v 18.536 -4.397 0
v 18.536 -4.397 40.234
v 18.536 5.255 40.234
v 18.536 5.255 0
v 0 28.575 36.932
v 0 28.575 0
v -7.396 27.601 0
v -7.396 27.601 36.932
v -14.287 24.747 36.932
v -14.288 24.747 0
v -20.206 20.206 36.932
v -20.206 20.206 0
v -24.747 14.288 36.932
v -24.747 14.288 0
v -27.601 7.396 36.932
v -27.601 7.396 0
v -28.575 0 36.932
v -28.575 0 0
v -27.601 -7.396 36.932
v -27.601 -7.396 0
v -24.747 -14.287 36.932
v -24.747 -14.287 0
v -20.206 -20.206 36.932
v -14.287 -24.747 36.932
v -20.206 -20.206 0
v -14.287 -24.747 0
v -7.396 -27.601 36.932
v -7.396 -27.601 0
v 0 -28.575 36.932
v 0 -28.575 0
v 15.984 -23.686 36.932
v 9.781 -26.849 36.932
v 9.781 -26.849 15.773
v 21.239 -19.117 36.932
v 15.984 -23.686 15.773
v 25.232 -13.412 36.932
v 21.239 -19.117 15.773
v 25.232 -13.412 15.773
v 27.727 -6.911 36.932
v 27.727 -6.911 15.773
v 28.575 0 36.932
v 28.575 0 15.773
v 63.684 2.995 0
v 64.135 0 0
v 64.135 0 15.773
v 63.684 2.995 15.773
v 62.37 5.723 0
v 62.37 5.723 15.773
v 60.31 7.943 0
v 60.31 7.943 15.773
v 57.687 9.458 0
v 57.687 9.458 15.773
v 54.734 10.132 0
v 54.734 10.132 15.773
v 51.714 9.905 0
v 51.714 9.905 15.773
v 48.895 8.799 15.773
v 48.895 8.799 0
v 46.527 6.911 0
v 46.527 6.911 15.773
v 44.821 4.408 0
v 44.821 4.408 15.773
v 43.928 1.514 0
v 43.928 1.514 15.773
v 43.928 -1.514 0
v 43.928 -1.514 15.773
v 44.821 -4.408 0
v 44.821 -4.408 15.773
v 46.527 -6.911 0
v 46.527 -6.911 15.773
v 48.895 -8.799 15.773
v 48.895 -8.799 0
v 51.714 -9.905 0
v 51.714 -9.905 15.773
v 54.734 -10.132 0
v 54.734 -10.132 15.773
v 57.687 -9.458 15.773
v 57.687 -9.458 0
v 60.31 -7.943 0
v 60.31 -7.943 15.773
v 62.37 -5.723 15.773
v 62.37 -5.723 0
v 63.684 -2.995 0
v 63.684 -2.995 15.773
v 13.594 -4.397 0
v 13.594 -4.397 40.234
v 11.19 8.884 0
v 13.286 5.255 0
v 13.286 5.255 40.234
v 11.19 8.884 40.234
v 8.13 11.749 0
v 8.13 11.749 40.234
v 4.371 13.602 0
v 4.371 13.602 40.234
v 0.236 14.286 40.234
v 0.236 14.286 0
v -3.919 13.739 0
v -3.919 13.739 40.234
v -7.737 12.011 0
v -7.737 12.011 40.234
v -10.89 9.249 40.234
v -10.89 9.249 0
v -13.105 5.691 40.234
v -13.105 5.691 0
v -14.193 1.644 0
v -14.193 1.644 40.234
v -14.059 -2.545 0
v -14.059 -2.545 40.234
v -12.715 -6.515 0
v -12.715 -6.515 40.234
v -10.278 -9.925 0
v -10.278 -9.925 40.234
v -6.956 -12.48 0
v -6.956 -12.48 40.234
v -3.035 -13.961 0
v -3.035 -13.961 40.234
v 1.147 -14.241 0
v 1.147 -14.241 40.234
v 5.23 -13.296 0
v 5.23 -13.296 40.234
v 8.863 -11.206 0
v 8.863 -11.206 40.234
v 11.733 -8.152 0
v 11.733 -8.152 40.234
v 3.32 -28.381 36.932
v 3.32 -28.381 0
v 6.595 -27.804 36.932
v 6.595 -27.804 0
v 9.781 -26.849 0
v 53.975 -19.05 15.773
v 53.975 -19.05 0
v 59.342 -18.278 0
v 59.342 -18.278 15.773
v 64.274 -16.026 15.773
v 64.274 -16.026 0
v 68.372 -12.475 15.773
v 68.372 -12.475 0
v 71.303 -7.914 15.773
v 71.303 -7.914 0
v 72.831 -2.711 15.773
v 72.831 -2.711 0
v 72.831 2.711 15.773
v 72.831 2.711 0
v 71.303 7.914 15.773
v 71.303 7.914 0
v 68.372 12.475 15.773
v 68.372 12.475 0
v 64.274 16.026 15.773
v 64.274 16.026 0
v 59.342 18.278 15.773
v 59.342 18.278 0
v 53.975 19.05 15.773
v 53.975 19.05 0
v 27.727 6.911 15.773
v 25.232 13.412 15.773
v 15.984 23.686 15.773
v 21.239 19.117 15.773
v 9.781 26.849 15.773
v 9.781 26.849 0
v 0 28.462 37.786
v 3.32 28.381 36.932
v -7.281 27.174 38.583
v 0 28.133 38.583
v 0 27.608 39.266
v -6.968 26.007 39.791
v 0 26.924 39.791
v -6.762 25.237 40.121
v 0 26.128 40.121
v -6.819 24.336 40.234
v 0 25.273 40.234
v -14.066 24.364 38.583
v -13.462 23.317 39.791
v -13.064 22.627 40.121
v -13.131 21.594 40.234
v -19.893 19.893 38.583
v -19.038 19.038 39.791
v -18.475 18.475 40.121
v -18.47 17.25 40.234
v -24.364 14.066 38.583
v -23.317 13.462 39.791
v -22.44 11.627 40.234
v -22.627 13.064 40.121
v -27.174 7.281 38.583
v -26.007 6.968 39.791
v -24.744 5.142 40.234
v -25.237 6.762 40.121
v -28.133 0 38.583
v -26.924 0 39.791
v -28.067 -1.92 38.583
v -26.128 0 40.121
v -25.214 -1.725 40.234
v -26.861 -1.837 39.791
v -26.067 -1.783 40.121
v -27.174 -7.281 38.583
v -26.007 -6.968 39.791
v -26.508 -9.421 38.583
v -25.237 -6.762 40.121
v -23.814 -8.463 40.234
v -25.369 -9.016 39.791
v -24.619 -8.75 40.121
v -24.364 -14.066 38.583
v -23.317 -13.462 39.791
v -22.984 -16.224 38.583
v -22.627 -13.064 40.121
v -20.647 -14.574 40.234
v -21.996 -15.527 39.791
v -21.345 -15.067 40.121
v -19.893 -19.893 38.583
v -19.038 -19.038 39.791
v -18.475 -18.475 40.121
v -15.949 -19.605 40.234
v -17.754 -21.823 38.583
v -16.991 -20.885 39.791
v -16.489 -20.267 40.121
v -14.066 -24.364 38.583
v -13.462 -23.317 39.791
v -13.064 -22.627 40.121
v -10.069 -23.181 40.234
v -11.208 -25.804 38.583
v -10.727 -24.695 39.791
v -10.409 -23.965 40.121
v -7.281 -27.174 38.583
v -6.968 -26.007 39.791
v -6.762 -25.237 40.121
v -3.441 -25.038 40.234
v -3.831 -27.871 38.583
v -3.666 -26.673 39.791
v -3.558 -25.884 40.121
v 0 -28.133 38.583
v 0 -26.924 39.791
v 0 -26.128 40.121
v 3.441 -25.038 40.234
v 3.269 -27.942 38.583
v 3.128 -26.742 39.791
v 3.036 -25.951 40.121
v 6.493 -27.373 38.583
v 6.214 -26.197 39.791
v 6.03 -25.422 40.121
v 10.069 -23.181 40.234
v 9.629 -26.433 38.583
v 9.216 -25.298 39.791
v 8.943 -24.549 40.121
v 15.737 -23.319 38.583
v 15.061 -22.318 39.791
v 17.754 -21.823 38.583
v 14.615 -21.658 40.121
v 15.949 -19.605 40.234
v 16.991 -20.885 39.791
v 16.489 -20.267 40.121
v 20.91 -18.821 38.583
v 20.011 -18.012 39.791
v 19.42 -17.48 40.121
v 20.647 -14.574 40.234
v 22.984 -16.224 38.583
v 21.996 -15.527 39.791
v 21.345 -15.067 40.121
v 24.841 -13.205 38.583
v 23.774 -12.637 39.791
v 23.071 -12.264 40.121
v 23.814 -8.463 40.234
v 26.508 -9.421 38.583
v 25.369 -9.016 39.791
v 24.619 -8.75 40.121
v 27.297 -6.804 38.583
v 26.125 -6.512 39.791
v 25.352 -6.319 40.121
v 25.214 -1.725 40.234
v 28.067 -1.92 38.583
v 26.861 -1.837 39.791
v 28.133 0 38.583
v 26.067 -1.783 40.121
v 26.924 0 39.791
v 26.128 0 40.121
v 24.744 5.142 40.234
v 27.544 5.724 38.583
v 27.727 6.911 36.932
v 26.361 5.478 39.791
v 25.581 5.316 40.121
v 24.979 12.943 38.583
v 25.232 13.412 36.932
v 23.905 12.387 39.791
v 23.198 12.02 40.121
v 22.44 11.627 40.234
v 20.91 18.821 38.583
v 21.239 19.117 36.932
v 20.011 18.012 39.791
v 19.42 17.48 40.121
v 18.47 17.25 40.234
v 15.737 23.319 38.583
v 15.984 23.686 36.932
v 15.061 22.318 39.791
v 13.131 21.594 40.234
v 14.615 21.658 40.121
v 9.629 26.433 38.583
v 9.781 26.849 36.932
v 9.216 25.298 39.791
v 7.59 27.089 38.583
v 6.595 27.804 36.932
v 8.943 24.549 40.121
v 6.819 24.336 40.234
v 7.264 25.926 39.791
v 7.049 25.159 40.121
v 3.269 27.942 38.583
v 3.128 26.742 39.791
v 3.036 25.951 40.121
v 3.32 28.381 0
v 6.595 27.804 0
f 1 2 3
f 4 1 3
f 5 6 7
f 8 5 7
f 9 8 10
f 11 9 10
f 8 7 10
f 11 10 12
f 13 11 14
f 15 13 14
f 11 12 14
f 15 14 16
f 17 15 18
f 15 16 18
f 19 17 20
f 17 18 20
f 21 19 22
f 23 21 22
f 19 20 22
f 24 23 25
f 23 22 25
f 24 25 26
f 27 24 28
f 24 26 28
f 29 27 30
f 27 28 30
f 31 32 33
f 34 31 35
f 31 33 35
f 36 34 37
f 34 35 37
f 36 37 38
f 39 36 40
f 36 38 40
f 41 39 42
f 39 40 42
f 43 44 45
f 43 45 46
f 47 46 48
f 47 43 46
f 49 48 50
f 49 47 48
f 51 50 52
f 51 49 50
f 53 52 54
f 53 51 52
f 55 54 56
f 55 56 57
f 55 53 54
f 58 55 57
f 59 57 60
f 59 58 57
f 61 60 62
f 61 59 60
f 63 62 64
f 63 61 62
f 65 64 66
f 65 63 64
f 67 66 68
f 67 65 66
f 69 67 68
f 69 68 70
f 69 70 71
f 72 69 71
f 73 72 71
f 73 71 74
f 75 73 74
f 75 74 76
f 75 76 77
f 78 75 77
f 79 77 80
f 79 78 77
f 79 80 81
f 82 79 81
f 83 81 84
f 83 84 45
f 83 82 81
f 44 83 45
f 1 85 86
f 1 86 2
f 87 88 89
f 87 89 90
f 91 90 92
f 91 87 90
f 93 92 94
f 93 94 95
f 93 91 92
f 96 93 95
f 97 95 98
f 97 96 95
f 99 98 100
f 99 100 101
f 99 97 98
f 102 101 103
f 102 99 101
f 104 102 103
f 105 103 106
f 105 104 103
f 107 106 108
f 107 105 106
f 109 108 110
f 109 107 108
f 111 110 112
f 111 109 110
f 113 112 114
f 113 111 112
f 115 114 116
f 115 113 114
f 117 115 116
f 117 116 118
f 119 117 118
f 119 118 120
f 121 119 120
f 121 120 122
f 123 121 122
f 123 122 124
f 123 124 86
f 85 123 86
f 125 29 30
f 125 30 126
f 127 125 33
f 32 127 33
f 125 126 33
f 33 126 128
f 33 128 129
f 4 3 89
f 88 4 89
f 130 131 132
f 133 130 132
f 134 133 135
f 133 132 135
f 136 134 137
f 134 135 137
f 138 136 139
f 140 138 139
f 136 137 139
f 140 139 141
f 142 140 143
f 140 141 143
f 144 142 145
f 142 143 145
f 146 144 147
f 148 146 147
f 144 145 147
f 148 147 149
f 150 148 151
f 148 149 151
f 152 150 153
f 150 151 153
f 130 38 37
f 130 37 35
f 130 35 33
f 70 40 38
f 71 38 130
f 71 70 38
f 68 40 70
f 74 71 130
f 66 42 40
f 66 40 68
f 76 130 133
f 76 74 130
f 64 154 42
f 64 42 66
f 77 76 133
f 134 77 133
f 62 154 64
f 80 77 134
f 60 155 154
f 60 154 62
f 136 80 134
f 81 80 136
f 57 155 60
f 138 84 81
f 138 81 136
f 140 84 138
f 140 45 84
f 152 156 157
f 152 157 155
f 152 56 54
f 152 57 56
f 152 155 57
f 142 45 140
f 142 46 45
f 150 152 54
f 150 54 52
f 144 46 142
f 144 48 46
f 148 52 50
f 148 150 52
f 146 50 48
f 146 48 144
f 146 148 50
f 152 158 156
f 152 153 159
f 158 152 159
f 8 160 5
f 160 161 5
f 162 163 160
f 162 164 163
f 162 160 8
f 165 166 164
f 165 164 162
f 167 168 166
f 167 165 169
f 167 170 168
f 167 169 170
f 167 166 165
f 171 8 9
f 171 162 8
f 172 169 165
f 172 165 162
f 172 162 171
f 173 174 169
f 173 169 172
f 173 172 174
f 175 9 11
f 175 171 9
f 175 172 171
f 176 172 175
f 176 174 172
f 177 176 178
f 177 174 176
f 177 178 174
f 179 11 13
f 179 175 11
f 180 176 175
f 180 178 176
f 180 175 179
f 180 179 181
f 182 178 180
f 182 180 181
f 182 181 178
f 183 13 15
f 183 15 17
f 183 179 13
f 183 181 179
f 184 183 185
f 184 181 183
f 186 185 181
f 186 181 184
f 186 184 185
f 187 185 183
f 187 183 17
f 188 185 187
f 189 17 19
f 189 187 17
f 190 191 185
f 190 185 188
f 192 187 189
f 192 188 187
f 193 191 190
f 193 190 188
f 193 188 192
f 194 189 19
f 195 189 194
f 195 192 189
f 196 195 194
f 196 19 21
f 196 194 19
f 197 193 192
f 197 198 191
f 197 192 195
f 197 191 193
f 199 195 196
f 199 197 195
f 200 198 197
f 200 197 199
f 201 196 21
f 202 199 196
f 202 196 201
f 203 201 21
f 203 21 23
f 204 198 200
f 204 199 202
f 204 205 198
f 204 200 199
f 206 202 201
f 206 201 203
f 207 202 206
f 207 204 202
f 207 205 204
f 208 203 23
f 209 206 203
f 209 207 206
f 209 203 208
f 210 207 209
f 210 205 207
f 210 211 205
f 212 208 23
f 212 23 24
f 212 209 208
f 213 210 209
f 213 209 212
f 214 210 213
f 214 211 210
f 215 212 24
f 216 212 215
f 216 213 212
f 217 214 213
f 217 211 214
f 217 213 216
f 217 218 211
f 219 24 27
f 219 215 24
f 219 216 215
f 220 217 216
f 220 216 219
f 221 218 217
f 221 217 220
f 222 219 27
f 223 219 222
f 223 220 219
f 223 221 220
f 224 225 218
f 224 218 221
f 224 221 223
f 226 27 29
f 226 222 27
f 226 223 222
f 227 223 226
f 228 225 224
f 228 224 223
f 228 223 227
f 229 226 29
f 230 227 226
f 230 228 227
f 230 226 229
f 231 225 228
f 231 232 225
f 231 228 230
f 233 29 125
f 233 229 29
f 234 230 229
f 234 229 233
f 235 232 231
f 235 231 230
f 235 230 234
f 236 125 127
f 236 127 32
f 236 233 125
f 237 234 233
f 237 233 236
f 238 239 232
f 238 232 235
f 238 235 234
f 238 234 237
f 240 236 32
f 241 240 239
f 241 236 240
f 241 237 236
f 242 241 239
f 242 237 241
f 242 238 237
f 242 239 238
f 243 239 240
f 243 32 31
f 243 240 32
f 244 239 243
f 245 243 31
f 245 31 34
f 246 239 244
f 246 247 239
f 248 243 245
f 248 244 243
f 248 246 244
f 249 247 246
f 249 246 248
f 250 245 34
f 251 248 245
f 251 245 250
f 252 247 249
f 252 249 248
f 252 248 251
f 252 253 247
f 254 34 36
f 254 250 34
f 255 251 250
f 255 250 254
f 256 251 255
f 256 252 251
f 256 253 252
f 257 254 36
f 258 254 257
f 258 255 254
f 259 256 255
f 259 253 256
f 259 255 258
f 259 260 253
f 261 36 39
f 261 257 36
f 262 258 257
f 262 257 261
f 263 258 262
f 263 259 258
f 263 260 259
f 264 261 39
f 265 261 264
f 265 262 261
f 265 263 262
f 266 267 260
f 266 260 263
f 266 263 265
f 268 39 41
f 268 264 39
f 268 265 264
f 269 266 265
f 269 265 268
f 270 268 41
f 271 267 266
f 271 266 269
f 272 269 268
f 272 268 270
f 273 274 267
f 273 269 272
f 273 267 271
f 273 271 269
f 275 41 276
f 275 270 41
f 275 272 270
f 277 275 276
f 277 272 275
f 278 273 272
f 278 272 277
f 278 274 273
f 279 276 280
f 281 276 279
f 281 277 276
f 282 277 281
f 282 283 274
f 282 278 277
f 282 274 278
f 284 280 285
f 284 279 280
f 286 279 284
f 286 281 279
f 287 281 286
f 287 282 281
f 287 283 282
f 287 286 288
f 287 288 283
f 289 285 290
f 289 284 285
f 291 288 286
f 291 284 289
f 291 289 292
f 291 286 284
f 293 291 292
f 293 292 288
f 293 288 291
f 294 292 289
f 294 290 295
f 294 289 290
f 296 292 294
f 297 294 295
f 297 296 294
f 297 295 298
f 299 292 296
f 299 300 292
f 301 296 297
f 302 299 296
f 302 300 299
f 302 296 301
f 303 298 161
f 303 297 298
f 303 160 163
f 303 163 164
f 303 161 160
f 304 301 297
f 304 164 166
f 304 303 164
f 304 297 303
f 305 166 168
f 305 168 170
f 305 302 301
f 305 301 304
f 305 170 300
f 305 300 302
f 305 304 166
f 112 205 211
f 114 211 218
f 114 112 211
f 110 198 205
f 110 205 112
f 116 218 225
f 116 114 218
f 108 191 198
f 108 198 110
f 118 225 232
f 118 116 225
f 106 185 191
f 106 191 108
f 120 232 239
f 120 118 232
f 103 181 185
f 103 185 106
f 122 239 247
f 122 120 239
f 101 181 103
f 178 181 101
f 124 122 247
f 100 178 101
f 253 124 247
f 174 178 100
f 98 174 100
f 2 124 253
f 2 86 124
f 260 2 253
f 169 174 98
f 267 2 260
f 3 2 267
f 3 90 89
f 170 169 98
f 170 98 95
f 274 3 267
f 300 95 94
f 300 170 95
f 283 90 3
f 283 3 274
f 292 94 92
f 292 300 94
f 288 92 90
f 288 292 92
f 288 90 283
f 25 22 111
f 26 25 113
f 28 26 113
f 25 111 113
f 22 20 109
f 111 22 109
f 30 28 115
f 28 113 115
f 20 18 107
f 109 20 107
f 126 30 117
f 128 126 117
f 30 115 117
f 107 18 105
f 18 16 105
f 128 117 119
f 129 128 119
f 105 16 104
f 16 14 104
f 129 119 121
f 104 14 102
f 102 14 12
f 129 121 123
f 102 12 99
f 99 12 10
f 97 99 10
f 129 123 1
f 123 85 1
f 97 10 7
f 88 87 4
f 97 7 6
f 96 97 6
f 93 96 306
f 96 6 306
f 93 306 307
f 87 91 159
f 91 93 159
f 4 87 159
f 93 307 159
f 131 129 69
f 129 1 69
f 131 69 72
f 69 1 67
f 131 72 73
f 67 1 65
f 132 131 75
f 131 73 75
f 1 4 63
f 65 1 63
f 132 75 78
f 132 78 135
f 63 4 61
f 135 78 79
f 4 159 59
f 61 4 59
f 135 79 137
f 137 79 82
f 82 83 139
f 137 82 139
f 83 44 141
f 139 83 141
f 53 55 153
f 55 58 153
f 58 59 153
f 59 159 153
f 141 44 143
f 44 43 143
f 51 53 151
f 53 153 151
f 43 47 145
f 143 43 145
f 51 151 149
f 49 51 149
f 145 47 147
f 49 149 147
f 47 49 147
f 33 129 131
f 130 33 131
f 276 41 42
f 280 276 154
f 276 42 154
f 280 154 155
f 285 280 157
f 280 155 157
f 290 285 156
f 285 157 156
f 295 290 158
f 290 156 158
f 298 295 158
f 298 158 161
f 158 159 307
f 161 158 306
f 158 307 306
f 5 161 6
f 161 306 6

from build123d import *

# Parameters (mm, degrees)
F0_R     = 14.2875
F1_DEPTH = 40.2336
F0_R_2   = 10.16
F2_DEPTH = 15.7734
F4_DEPTH = 40.2336


# Not quite as in the source:
# - a fillet or chamfer that OpenCascade refuses, or shapes differently, is made with other operations: its cross-section is extruded or revolved along the edge and cut away or added


with BuildPart() as f1:
    # F0 (on Top) → F1 (new body)
    with BuildSketch(Plane.XY):
        with BuildLine():
            ThreePointArc((9.780704698, 26.8489932886), (4.9659159165, 28.1401901932), (0, 28.575))
            Line((0, 28.575), (9.780704698, 26.8489932886))
        make_face()
        with BuildLine():
            Line((9.780704698, -26.8489932886), (0, -28.575))
            ThreePointArc((0, -28.575), (4.9659159165, -28.1401901932), (9.780704698, -26.8489932886))
        make_face()
        with BuildLine():
            Line((9.780704698, 26.8489932886), (0, 28.575))
            ThreePointArc((0, 28.575), (-28.575, 0), (0, -28.575))
            Line((0, -28.575), (9.780704698, -26.8489932886))
            ThreePointArc((9.780704698, -26.8489932886), (23.4095521288, -16.3866864902), (28.575, 0))
            ThreePointArc((28.575, 0), (23.4095521288, 16.3866864902), (9.780704698, 26.8489932886))
        make_face()
        Circle(F0_R, mode=Mode.SUBTRACT)
    extrude(amount=F1_DEPTH)

    # F0 (on Top) → F2 (join)
    with BuildSketch(Plane.XY):
        with BuildLine():
            Line((53.975, 19.05), (9.780704698, 26.8489932886))
            ThreePointArc((9.780704698, 26.8489932886), (23.4095521288, 16.3866864902), (28.575, 0))
            ThreePointArc((28.575, 0), (23.4095521288, -16.3866864902), (9.780704698, -26.8489932886))
            Line((9.780704698, -26.8489932886), (53.975, -19.05))
            ThreePointArc((53.975, -19.05), (73.025, 0), (53.975, 19.05))
        make_face()
        with Locations((53.975, 0)):
            Circle(F0_R_2, mode=Mode.SUBTRACT)
    extrude(amount=F2_DEPTH)

    # F3 (on face) → F4 (cut, through all)
    with BuildSketch(Plane.XY.offset(40.2336)):
        with BuildLine():
            Line((18.5357414117, 5.2549776766), (13.2860026294, 5.2549776766))
            ThreePointArc((13.2860026294, 5.2549776766), (14.0348925685, 2.6747797744), (14.2875, 0))
            ThreePointArc((14.2875, 0), (14.1130788652, -2.2256821862), (13.5940741111, -4.3970223234))
            Line((13.5940741111, -4.3970223234), (18.5357414117, -4.3970223234))
            Line((18.5357414117, -4.3970223234), (18.5357414117, 5.2549776766))
        make_face()
    extrude(amount=-F4_DEPTH, mode=Mode.SUBTRACT)

    # F5: fillet of radius 3.302 on 1 edges, made by hand

    # F5_s1 → F5_t2 (revolve, cut)
    with BuildSketch(Plane.YZ):
        with BuildLine():
            ThreePointArc((28.575, 36.9316), (27.6078665915, 39.2664665915), (25.273, 40.2336))
            Line((25.273, 40.2336), (28.575, 40.2336))
            Line((28.575, 40.2336), (28.575, 36.9316))
        make_face()
    revolve(axis=Axis((0, 0, 40.2336), (0, 0, 1)), mode=Mode.SUBTRACT)


solid = f1.part
